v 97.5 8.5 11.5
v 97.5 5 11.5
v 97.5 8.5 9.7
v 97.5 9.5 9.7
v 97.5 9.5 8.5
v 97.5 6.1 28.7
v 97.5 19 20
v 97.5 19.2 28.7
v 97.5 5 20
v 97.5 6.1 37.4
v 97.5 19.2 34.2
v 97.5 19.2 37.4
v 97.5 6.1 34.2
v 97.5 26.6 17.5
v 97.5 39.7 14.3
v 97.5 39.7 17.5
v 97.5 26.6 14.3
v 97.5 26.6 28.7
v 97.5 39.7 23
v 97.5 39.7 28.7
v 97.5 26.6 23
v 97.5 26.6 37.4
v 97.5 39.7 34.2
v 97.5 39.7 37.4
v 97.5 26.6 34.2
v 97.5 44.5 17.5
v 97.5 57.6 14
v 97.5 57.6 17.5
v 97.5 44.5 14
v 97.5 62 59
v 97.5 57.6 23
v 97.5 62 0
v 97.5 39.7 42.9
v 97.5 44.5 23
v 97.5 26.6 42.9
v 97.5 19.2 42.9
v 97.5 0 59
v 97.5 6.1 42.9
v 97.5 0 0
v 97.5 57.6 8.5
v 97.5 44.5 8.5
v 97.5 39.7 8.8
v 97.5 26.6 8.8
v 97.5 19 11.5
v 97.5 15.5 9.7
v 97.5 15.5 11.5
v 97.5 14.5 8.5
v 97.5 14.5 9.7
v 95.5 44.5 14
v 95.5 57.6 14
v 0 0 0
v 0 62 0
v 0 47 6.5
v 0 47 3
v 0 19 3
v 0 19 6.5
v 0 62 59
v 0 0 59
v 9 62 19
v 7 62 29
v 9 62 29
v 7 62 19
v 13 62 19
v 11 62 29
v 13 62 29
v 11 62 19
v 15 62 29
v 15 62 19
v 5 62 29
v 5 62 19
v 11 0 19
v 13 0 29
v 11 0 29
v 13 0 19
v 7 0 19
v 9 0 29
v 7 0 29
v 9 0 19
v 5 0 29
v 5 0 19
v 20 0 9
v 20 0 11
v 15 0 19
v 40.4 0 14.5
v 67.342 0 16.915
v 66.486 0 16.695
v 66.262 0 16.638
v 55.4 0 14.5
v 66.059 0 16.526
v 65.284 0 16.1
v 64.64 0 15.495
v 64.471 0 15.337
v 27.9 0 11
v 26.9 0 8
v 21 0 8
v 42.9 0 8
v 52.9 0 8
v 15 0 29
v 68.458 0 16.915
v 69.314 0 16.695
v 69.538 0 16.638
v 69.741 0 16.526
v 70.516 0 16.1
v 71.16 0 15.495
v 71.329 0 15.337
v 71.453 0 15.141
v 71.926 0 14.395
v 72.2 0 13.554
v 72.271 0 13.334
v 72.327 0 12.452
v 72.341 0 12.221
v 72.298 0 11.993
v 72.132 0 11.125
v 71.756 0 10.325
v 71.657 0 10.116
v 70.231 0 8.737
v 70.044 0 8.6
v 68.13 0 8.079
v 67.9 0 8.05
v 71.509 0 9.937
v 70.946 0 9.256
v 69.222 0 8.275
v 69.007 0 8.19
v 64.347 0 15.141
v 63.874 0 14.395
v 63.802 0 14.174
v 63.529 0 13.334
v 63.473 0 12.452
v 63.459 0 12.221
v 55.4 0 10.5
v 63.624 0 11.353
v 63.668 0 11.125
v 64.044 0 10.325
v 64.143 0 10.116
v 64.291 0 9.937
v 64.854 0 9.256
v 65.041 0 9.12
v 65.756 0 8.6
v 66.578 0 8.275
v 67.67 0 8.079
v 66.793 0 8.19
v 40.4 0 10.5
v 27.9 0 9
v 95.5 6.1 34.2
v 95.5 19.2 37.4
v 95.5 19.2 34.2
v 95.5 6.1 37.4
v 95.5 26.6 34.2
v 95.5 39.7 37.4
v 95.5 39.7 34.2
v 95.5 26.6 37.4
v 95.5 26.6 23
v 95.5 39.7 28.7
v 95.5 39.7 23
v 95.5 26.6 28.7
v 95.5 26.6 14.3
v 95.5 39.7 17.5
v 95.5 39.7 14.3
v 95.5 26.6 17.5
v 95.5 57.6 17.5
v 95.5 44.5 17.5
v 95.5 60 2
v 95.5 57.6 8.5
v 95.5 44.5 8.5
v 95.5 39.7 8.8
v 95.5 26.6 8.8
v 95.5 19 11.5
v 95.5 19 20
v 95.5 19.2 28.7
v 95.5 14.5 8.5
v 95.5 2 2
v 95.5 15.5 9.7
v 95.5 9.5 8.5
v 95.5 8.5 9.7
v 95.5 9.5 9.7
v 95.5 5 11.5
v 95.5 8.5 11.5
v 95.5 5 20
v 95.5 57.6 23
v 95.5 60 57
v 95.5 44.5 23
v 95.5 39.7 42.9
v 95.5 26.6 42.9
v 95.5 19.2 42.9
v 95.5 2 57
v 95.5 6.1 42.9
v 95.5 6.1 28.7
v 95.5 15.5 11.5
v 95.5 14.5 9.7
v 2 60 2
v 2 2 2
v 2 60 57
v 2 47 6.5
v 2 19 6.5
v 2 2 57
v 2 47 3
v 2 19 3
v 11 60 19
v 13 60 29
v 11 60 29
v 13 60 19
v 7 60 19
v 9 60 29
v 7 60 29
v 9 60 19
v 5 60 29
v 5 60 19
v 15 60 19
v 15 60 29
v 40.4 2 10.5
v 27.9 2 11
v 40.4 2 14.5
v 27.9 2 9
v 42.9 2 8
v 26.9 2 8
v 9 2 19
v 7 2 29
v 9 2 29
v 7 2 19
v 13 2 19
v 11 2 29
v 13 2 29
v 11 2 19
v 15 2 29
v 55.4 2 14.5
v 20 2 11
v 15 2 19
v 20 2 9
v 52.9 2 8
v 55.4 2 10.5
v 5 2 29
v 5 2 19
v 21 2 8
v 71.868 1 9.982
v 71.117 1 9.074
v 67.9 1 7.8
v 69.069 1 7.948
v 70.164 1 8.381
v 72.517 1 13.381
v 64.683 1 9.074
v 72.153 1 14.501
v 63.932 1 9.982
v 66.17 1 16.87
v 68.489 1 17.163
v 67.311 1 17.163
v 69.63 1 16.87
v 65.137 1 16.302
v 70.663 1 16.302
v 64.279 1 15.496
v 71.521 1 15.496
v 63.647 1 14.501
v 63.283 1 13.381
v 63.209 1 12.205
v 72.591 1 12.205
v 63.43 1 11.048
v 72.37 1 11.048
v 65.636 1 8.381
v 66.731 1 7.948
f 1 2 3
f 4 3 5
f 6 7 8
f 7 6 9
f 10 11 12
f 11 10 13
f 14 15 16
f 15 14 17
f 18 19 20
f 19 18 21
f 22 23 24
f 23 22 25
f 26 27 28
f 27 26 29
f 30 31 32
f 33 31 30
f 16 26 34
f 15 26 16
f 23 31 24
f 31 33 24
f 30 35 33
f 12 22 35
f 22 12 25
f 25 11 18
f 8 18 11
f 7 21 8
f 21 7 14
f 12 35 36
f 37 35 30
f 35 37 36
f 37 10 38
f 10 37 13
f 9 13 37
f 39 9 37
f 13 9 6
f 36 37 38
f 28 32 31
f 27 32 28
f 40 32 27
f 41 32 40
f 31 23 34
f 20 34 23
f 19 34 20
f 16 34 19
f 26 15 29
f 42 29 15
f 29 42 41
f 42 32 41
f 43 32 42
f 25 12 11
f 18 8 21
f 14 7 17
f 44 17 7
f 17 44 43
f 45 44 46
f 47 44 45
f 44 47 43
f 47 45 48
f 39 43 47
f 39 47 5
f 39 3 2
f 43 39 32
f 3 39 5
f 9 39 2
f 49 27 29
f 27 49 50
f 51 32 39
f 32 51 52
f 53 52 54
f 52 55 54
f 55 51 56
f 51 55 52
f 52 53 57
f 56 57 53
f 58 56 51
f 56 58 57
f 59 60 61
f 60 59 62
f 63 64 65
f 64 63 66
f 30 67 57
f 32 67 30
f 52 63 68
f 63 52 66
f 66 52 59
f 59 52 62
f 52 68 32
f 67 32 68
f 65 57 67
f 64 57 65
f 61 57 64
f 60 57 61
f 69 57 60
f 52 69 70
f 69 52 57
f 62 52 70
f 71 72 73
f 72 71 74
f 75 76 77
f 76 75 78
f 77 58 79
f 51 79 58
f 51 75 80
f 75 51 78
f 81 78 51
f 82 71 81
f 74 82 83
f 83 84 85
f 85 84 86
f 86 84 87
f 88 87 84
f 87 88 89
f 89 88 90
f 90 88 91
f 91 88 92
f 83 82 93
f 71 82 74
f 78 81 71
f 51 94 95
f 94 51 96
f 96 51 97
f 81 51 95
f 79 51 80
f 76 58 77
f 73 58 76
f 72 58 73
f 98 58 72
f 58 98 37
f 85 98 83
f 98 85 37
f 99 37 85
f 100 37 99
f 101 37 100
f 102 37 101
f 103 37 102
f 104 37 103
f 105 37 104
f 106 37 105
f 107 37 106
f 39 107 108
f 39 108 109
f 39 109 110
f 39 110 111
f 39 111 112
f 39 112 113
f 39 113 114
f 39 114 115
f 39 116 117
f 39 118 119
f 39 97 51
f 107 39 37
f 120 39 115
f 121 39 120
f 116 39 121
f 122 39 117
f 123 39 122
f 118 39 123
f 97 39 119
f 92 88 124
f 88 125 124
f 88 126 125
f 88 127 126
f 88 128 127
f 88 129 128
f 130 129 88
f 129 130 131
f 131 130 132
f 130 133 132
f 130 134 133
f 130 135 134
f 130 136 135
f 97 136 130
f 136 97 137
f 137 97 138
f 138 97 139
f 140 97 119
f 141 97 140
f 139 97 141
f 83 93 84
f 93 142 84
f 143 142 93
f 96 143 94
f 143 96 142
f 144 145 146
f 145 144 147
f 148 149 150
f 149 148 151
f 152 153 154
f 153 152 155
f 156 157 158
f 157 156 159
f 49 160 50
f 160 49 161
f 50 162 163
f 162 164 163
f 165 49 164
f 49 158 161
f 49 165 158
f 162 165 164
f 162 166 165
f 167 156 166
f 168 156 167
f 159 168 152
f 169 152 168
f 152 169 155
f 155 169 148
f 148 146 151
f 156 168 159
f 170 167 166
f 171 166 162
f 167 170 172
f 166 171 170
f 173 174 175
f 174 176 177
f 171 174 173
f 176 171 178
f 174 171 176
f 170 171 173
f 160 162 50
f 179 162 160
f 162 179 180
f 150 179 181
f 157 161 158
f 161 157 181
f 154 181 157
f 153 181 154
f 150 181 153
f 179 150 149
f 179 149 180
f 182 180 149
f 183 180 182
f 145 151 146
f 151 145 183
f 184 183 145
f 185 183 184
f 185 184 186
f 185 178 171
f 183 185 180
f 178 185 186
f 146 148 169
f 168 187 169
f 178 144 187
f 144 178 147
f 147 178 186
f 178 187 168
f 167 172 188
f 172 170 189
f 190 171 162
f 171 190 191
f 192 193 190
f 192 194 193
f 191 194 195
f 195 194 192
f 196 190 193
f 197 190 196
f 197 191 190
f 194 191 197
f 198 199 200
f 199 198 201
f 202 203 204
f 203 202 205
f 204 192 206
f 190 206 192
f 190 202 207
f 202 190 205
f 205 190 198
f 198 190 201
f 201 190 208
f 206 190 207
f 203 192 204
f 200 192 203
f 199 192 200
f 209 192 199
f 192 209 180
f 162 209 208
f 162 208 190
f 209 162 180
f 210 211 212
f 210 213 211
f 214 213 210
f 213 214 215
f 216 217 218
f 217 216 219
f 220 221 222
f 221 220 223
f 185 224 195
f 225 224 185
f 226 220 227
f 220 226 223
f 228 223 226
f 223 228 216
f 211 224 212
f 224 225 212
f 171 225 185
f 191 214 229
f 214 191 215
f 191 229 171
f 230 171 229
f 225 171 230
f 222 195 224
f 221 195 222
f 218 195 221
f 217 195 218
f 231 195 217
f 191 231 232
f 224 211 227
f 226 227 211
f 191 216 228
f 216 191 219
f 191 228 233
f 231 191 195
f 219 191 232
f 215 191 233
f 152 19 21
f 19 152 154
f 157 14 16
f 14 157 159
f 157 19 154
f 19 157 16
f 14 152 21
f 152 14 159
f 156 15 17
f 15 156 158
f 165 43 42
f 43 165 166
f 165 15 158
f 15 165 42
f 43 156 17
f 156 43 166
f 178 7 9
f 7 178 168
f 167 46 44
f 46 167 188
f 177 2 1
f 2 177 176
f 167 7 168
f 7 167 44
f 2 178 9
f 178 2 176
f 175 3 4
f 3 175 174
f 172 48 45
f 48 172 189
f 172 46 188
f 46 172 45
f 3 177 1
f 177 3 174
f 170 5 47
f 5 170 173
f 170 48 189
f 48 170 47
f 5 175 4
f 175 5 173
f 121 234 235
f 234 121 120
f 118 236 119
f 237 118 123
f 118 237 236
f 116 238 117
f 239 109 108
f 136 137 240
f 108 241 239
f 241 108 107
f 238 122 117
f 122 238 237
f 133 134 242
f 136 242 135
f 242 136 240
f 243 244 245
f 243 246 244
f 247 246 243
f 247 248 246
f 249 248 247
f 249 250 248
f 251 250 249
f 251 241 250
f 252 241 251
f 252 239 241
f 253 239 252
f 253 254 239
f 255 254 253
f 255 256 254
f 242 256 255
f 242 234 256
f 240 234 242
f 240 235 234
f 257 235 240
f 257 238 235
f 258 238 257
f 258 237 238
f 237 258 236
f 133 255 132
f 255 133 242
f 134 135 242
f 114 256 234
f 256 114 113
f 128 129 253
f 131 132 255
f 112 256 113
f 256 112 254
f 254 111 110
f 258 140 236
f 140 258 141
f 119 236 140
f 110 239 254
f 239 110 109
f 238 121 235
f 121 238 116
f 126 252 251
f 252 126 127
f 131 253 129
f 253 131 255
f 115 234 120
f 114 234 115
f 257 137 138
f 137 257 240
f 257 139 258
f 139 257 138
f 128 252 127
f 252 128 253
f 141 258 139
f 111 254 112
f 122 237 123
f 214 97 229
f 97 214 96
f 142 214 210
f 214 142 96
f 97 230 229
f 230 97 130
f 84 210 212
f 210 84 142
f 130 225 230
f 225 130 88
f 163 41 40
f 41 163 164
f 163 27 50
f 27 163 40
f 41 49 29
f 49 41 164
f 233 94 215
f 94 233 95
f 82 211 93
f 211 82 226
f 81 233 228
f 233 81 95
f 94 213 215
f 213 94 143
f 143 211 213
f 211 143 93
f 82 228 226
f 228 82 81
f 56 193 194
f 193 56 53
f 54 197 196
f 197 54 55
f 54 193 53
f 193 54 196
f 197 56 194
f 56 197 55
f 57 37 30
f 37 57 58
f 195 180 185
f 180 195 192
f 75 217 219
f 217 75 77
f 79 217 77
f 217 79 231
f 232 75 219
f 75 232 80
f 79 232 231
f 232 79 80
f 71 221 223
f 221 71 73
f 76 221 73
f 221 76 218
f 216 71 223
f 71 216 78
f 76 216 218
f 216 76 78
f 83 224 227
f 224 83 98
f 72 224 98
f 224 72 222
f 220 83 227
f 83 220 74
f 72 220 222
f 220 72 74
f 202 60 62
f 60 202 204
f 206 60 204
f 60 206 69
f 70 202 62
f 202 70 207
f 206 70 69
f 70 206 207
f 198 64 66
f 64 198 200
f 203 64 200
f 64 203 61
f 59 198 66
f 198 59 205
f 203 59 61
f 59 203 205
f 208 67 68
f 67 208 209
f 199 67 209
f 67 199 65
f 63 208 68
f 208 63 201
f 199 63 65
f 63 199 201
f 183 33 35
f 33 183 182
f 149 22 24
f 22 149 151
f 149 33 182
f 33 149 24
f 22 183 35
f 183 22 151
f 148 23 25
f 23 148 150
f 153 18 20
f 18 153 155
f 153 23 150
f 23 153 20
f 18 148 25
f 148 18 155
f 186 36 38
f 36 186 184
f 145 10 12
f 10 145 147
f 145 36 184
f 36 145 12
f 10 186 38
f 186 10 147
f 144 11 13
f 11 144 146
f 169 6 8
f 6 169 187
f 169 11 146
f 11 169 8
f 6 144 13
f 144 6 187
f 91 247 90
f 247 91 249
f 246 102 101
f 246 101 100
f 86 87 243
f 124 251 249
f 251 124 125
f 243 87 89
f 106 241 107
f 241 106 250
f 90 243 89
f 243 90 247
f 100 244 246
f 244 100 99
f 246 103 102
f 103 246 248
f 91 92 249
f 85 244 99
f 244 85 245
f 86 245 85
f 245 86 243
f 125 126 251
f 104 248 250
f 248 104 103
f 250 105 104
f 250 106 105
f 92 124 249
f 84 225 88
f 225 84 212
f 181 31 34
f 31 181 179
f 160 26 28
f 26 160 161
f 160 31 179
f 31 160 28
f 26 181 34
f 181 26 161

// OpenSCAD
width = 60.5;
length = 93.5;
thickness = 2;

total_height = 65;

// Raspberry PI
*translate([43.4+thickness,28.5+thickness,6.5]) {
	import("../RaspberryPi_B.stl");
}

// ----- Modules -----//

// Base box
module basebox() {
	difference() {
		cube([length+(thickness*2),(width+(thickness*2))-2.5,14]);
		
		translate ([thickness, thickness, thickness]) {
			cube([length,width-2.5,28]);
		}
	}
}

// Top box
module topbox() {
	translate([0,0,14]) {
		difference() {
			cube([length+(thickness*2),(width+(thickness*2))-2.5,45]);
			
			translate ([thickness, thickness, -thickness]) {
				cube([length,width-2.5,45]);
			}
		}
	}
}

// Hole - Jack
module jack() {
	translate ([67.9,1,12.5]) {//67.9
		rotate([90,90,0]) cylinder(4,4.7,3.7,$fn=25);
	}
}

// Hole - Digital
module digital() {
	translate ([48.6,62.5,16.2]) {
		rotate([90,90,0]) cylinder(3,6,5,$fn=25);
	}
}

// Hole - HDMI
module hdmi() {
	translate ([40.4,-1,10.5]) {
		hull(){
		cube([15,4,4]);
		translate([2.5,0,-2.5]) cube([10,4,1]);
		}
	}
}

// Hole - Ethernet
module ethernet() {
	union() {
	translate ([94,5,11.5]) cube([5,14,8.5]);
	translate ([94,8.5,9.7]) cube([5,7,2]);
	translate ([94,9.5,8.5]) cube([5,5,2]);
	}
}

// Hole - USB
module usb() {
	translate ([94,26.6,17.5]) cube([5,13.1,5.5]);
	translate ([94,26.6,8.8]) cube([5,13.1,5.5]);
}

// Hole - Power
module power() {
	hull() {
		translate ([20,-1,9]) cube([7.9,8,2]);
		translate ([21,-1,8]) cube([5.9,8,2]);
	}
}

// Hole - SD Card
module sdcard() {
	translate ([-1,19,3]) cube([8,28,3.5]);
}

// Ethernet edge
module ethernet_edge() {
	cube([8.5,23,12]);
}

// Ventilation
module vents() {
  cube([2,10,10]);
  translate([4,0,0]) cube([2,10,10]);
  translate([8,0,0]) cube([2,10,10]);
}


// Elements //

difference() {
	union() {
		union() {
			basebox();
			/*difference() {
				translate ([94,0,2]) ethernet_edge();
				
			}*/
		}
	/*translate ([2,58,2]) cube([20,2,4]);
	translate ([2,2,2]) cube([20,2,4]);
	translate ([75,58,2]) cube([20,2,4]);
	translate ([68,2,2]) cube([20,2,4]);*/
	}
	jack();
	//digital();
	hdmi();
	//translate ([91,-1,-1]) cube([8,22,18]); // Inset in Ethernet edge
	usb();
	translate ([94,44.5,8.5]) cube([5,13.1,5.5]);
	power();
	sdcard();
	ethernet();
}

difference() {
	union() {
		union() {
			topbox();
			/*difference() {
				translate ([94,0,14]) ethernet_edge();
				
			}*/
		}
	/*translate ([68,2,9]) cube([20,2,17]);
	translate ([18,2,9]) cube([20,2,17]);
	translate ([75,58,9]) cube([20,2,17]);
	translate ([18,58,9]) cube([20,2,17]);
	translate ([2,20,9]) cube([2,20,17]);*/
	}

	jack();
	//digital();
	hdmi();
	//translate ([91,-1,13]) cube([8,22,18]); // Inset in Ethernet edge
	usb();
	ethernet();
	translate([5,-1,19]) vents();
	translate([5,53,19]) vents();
	translate ([94,44.5,17.5]) cube([5,13.1,5.5]);
	translate([0,0,19.9])usb();
	translate([0,-20.5,19.9])usb();
}
